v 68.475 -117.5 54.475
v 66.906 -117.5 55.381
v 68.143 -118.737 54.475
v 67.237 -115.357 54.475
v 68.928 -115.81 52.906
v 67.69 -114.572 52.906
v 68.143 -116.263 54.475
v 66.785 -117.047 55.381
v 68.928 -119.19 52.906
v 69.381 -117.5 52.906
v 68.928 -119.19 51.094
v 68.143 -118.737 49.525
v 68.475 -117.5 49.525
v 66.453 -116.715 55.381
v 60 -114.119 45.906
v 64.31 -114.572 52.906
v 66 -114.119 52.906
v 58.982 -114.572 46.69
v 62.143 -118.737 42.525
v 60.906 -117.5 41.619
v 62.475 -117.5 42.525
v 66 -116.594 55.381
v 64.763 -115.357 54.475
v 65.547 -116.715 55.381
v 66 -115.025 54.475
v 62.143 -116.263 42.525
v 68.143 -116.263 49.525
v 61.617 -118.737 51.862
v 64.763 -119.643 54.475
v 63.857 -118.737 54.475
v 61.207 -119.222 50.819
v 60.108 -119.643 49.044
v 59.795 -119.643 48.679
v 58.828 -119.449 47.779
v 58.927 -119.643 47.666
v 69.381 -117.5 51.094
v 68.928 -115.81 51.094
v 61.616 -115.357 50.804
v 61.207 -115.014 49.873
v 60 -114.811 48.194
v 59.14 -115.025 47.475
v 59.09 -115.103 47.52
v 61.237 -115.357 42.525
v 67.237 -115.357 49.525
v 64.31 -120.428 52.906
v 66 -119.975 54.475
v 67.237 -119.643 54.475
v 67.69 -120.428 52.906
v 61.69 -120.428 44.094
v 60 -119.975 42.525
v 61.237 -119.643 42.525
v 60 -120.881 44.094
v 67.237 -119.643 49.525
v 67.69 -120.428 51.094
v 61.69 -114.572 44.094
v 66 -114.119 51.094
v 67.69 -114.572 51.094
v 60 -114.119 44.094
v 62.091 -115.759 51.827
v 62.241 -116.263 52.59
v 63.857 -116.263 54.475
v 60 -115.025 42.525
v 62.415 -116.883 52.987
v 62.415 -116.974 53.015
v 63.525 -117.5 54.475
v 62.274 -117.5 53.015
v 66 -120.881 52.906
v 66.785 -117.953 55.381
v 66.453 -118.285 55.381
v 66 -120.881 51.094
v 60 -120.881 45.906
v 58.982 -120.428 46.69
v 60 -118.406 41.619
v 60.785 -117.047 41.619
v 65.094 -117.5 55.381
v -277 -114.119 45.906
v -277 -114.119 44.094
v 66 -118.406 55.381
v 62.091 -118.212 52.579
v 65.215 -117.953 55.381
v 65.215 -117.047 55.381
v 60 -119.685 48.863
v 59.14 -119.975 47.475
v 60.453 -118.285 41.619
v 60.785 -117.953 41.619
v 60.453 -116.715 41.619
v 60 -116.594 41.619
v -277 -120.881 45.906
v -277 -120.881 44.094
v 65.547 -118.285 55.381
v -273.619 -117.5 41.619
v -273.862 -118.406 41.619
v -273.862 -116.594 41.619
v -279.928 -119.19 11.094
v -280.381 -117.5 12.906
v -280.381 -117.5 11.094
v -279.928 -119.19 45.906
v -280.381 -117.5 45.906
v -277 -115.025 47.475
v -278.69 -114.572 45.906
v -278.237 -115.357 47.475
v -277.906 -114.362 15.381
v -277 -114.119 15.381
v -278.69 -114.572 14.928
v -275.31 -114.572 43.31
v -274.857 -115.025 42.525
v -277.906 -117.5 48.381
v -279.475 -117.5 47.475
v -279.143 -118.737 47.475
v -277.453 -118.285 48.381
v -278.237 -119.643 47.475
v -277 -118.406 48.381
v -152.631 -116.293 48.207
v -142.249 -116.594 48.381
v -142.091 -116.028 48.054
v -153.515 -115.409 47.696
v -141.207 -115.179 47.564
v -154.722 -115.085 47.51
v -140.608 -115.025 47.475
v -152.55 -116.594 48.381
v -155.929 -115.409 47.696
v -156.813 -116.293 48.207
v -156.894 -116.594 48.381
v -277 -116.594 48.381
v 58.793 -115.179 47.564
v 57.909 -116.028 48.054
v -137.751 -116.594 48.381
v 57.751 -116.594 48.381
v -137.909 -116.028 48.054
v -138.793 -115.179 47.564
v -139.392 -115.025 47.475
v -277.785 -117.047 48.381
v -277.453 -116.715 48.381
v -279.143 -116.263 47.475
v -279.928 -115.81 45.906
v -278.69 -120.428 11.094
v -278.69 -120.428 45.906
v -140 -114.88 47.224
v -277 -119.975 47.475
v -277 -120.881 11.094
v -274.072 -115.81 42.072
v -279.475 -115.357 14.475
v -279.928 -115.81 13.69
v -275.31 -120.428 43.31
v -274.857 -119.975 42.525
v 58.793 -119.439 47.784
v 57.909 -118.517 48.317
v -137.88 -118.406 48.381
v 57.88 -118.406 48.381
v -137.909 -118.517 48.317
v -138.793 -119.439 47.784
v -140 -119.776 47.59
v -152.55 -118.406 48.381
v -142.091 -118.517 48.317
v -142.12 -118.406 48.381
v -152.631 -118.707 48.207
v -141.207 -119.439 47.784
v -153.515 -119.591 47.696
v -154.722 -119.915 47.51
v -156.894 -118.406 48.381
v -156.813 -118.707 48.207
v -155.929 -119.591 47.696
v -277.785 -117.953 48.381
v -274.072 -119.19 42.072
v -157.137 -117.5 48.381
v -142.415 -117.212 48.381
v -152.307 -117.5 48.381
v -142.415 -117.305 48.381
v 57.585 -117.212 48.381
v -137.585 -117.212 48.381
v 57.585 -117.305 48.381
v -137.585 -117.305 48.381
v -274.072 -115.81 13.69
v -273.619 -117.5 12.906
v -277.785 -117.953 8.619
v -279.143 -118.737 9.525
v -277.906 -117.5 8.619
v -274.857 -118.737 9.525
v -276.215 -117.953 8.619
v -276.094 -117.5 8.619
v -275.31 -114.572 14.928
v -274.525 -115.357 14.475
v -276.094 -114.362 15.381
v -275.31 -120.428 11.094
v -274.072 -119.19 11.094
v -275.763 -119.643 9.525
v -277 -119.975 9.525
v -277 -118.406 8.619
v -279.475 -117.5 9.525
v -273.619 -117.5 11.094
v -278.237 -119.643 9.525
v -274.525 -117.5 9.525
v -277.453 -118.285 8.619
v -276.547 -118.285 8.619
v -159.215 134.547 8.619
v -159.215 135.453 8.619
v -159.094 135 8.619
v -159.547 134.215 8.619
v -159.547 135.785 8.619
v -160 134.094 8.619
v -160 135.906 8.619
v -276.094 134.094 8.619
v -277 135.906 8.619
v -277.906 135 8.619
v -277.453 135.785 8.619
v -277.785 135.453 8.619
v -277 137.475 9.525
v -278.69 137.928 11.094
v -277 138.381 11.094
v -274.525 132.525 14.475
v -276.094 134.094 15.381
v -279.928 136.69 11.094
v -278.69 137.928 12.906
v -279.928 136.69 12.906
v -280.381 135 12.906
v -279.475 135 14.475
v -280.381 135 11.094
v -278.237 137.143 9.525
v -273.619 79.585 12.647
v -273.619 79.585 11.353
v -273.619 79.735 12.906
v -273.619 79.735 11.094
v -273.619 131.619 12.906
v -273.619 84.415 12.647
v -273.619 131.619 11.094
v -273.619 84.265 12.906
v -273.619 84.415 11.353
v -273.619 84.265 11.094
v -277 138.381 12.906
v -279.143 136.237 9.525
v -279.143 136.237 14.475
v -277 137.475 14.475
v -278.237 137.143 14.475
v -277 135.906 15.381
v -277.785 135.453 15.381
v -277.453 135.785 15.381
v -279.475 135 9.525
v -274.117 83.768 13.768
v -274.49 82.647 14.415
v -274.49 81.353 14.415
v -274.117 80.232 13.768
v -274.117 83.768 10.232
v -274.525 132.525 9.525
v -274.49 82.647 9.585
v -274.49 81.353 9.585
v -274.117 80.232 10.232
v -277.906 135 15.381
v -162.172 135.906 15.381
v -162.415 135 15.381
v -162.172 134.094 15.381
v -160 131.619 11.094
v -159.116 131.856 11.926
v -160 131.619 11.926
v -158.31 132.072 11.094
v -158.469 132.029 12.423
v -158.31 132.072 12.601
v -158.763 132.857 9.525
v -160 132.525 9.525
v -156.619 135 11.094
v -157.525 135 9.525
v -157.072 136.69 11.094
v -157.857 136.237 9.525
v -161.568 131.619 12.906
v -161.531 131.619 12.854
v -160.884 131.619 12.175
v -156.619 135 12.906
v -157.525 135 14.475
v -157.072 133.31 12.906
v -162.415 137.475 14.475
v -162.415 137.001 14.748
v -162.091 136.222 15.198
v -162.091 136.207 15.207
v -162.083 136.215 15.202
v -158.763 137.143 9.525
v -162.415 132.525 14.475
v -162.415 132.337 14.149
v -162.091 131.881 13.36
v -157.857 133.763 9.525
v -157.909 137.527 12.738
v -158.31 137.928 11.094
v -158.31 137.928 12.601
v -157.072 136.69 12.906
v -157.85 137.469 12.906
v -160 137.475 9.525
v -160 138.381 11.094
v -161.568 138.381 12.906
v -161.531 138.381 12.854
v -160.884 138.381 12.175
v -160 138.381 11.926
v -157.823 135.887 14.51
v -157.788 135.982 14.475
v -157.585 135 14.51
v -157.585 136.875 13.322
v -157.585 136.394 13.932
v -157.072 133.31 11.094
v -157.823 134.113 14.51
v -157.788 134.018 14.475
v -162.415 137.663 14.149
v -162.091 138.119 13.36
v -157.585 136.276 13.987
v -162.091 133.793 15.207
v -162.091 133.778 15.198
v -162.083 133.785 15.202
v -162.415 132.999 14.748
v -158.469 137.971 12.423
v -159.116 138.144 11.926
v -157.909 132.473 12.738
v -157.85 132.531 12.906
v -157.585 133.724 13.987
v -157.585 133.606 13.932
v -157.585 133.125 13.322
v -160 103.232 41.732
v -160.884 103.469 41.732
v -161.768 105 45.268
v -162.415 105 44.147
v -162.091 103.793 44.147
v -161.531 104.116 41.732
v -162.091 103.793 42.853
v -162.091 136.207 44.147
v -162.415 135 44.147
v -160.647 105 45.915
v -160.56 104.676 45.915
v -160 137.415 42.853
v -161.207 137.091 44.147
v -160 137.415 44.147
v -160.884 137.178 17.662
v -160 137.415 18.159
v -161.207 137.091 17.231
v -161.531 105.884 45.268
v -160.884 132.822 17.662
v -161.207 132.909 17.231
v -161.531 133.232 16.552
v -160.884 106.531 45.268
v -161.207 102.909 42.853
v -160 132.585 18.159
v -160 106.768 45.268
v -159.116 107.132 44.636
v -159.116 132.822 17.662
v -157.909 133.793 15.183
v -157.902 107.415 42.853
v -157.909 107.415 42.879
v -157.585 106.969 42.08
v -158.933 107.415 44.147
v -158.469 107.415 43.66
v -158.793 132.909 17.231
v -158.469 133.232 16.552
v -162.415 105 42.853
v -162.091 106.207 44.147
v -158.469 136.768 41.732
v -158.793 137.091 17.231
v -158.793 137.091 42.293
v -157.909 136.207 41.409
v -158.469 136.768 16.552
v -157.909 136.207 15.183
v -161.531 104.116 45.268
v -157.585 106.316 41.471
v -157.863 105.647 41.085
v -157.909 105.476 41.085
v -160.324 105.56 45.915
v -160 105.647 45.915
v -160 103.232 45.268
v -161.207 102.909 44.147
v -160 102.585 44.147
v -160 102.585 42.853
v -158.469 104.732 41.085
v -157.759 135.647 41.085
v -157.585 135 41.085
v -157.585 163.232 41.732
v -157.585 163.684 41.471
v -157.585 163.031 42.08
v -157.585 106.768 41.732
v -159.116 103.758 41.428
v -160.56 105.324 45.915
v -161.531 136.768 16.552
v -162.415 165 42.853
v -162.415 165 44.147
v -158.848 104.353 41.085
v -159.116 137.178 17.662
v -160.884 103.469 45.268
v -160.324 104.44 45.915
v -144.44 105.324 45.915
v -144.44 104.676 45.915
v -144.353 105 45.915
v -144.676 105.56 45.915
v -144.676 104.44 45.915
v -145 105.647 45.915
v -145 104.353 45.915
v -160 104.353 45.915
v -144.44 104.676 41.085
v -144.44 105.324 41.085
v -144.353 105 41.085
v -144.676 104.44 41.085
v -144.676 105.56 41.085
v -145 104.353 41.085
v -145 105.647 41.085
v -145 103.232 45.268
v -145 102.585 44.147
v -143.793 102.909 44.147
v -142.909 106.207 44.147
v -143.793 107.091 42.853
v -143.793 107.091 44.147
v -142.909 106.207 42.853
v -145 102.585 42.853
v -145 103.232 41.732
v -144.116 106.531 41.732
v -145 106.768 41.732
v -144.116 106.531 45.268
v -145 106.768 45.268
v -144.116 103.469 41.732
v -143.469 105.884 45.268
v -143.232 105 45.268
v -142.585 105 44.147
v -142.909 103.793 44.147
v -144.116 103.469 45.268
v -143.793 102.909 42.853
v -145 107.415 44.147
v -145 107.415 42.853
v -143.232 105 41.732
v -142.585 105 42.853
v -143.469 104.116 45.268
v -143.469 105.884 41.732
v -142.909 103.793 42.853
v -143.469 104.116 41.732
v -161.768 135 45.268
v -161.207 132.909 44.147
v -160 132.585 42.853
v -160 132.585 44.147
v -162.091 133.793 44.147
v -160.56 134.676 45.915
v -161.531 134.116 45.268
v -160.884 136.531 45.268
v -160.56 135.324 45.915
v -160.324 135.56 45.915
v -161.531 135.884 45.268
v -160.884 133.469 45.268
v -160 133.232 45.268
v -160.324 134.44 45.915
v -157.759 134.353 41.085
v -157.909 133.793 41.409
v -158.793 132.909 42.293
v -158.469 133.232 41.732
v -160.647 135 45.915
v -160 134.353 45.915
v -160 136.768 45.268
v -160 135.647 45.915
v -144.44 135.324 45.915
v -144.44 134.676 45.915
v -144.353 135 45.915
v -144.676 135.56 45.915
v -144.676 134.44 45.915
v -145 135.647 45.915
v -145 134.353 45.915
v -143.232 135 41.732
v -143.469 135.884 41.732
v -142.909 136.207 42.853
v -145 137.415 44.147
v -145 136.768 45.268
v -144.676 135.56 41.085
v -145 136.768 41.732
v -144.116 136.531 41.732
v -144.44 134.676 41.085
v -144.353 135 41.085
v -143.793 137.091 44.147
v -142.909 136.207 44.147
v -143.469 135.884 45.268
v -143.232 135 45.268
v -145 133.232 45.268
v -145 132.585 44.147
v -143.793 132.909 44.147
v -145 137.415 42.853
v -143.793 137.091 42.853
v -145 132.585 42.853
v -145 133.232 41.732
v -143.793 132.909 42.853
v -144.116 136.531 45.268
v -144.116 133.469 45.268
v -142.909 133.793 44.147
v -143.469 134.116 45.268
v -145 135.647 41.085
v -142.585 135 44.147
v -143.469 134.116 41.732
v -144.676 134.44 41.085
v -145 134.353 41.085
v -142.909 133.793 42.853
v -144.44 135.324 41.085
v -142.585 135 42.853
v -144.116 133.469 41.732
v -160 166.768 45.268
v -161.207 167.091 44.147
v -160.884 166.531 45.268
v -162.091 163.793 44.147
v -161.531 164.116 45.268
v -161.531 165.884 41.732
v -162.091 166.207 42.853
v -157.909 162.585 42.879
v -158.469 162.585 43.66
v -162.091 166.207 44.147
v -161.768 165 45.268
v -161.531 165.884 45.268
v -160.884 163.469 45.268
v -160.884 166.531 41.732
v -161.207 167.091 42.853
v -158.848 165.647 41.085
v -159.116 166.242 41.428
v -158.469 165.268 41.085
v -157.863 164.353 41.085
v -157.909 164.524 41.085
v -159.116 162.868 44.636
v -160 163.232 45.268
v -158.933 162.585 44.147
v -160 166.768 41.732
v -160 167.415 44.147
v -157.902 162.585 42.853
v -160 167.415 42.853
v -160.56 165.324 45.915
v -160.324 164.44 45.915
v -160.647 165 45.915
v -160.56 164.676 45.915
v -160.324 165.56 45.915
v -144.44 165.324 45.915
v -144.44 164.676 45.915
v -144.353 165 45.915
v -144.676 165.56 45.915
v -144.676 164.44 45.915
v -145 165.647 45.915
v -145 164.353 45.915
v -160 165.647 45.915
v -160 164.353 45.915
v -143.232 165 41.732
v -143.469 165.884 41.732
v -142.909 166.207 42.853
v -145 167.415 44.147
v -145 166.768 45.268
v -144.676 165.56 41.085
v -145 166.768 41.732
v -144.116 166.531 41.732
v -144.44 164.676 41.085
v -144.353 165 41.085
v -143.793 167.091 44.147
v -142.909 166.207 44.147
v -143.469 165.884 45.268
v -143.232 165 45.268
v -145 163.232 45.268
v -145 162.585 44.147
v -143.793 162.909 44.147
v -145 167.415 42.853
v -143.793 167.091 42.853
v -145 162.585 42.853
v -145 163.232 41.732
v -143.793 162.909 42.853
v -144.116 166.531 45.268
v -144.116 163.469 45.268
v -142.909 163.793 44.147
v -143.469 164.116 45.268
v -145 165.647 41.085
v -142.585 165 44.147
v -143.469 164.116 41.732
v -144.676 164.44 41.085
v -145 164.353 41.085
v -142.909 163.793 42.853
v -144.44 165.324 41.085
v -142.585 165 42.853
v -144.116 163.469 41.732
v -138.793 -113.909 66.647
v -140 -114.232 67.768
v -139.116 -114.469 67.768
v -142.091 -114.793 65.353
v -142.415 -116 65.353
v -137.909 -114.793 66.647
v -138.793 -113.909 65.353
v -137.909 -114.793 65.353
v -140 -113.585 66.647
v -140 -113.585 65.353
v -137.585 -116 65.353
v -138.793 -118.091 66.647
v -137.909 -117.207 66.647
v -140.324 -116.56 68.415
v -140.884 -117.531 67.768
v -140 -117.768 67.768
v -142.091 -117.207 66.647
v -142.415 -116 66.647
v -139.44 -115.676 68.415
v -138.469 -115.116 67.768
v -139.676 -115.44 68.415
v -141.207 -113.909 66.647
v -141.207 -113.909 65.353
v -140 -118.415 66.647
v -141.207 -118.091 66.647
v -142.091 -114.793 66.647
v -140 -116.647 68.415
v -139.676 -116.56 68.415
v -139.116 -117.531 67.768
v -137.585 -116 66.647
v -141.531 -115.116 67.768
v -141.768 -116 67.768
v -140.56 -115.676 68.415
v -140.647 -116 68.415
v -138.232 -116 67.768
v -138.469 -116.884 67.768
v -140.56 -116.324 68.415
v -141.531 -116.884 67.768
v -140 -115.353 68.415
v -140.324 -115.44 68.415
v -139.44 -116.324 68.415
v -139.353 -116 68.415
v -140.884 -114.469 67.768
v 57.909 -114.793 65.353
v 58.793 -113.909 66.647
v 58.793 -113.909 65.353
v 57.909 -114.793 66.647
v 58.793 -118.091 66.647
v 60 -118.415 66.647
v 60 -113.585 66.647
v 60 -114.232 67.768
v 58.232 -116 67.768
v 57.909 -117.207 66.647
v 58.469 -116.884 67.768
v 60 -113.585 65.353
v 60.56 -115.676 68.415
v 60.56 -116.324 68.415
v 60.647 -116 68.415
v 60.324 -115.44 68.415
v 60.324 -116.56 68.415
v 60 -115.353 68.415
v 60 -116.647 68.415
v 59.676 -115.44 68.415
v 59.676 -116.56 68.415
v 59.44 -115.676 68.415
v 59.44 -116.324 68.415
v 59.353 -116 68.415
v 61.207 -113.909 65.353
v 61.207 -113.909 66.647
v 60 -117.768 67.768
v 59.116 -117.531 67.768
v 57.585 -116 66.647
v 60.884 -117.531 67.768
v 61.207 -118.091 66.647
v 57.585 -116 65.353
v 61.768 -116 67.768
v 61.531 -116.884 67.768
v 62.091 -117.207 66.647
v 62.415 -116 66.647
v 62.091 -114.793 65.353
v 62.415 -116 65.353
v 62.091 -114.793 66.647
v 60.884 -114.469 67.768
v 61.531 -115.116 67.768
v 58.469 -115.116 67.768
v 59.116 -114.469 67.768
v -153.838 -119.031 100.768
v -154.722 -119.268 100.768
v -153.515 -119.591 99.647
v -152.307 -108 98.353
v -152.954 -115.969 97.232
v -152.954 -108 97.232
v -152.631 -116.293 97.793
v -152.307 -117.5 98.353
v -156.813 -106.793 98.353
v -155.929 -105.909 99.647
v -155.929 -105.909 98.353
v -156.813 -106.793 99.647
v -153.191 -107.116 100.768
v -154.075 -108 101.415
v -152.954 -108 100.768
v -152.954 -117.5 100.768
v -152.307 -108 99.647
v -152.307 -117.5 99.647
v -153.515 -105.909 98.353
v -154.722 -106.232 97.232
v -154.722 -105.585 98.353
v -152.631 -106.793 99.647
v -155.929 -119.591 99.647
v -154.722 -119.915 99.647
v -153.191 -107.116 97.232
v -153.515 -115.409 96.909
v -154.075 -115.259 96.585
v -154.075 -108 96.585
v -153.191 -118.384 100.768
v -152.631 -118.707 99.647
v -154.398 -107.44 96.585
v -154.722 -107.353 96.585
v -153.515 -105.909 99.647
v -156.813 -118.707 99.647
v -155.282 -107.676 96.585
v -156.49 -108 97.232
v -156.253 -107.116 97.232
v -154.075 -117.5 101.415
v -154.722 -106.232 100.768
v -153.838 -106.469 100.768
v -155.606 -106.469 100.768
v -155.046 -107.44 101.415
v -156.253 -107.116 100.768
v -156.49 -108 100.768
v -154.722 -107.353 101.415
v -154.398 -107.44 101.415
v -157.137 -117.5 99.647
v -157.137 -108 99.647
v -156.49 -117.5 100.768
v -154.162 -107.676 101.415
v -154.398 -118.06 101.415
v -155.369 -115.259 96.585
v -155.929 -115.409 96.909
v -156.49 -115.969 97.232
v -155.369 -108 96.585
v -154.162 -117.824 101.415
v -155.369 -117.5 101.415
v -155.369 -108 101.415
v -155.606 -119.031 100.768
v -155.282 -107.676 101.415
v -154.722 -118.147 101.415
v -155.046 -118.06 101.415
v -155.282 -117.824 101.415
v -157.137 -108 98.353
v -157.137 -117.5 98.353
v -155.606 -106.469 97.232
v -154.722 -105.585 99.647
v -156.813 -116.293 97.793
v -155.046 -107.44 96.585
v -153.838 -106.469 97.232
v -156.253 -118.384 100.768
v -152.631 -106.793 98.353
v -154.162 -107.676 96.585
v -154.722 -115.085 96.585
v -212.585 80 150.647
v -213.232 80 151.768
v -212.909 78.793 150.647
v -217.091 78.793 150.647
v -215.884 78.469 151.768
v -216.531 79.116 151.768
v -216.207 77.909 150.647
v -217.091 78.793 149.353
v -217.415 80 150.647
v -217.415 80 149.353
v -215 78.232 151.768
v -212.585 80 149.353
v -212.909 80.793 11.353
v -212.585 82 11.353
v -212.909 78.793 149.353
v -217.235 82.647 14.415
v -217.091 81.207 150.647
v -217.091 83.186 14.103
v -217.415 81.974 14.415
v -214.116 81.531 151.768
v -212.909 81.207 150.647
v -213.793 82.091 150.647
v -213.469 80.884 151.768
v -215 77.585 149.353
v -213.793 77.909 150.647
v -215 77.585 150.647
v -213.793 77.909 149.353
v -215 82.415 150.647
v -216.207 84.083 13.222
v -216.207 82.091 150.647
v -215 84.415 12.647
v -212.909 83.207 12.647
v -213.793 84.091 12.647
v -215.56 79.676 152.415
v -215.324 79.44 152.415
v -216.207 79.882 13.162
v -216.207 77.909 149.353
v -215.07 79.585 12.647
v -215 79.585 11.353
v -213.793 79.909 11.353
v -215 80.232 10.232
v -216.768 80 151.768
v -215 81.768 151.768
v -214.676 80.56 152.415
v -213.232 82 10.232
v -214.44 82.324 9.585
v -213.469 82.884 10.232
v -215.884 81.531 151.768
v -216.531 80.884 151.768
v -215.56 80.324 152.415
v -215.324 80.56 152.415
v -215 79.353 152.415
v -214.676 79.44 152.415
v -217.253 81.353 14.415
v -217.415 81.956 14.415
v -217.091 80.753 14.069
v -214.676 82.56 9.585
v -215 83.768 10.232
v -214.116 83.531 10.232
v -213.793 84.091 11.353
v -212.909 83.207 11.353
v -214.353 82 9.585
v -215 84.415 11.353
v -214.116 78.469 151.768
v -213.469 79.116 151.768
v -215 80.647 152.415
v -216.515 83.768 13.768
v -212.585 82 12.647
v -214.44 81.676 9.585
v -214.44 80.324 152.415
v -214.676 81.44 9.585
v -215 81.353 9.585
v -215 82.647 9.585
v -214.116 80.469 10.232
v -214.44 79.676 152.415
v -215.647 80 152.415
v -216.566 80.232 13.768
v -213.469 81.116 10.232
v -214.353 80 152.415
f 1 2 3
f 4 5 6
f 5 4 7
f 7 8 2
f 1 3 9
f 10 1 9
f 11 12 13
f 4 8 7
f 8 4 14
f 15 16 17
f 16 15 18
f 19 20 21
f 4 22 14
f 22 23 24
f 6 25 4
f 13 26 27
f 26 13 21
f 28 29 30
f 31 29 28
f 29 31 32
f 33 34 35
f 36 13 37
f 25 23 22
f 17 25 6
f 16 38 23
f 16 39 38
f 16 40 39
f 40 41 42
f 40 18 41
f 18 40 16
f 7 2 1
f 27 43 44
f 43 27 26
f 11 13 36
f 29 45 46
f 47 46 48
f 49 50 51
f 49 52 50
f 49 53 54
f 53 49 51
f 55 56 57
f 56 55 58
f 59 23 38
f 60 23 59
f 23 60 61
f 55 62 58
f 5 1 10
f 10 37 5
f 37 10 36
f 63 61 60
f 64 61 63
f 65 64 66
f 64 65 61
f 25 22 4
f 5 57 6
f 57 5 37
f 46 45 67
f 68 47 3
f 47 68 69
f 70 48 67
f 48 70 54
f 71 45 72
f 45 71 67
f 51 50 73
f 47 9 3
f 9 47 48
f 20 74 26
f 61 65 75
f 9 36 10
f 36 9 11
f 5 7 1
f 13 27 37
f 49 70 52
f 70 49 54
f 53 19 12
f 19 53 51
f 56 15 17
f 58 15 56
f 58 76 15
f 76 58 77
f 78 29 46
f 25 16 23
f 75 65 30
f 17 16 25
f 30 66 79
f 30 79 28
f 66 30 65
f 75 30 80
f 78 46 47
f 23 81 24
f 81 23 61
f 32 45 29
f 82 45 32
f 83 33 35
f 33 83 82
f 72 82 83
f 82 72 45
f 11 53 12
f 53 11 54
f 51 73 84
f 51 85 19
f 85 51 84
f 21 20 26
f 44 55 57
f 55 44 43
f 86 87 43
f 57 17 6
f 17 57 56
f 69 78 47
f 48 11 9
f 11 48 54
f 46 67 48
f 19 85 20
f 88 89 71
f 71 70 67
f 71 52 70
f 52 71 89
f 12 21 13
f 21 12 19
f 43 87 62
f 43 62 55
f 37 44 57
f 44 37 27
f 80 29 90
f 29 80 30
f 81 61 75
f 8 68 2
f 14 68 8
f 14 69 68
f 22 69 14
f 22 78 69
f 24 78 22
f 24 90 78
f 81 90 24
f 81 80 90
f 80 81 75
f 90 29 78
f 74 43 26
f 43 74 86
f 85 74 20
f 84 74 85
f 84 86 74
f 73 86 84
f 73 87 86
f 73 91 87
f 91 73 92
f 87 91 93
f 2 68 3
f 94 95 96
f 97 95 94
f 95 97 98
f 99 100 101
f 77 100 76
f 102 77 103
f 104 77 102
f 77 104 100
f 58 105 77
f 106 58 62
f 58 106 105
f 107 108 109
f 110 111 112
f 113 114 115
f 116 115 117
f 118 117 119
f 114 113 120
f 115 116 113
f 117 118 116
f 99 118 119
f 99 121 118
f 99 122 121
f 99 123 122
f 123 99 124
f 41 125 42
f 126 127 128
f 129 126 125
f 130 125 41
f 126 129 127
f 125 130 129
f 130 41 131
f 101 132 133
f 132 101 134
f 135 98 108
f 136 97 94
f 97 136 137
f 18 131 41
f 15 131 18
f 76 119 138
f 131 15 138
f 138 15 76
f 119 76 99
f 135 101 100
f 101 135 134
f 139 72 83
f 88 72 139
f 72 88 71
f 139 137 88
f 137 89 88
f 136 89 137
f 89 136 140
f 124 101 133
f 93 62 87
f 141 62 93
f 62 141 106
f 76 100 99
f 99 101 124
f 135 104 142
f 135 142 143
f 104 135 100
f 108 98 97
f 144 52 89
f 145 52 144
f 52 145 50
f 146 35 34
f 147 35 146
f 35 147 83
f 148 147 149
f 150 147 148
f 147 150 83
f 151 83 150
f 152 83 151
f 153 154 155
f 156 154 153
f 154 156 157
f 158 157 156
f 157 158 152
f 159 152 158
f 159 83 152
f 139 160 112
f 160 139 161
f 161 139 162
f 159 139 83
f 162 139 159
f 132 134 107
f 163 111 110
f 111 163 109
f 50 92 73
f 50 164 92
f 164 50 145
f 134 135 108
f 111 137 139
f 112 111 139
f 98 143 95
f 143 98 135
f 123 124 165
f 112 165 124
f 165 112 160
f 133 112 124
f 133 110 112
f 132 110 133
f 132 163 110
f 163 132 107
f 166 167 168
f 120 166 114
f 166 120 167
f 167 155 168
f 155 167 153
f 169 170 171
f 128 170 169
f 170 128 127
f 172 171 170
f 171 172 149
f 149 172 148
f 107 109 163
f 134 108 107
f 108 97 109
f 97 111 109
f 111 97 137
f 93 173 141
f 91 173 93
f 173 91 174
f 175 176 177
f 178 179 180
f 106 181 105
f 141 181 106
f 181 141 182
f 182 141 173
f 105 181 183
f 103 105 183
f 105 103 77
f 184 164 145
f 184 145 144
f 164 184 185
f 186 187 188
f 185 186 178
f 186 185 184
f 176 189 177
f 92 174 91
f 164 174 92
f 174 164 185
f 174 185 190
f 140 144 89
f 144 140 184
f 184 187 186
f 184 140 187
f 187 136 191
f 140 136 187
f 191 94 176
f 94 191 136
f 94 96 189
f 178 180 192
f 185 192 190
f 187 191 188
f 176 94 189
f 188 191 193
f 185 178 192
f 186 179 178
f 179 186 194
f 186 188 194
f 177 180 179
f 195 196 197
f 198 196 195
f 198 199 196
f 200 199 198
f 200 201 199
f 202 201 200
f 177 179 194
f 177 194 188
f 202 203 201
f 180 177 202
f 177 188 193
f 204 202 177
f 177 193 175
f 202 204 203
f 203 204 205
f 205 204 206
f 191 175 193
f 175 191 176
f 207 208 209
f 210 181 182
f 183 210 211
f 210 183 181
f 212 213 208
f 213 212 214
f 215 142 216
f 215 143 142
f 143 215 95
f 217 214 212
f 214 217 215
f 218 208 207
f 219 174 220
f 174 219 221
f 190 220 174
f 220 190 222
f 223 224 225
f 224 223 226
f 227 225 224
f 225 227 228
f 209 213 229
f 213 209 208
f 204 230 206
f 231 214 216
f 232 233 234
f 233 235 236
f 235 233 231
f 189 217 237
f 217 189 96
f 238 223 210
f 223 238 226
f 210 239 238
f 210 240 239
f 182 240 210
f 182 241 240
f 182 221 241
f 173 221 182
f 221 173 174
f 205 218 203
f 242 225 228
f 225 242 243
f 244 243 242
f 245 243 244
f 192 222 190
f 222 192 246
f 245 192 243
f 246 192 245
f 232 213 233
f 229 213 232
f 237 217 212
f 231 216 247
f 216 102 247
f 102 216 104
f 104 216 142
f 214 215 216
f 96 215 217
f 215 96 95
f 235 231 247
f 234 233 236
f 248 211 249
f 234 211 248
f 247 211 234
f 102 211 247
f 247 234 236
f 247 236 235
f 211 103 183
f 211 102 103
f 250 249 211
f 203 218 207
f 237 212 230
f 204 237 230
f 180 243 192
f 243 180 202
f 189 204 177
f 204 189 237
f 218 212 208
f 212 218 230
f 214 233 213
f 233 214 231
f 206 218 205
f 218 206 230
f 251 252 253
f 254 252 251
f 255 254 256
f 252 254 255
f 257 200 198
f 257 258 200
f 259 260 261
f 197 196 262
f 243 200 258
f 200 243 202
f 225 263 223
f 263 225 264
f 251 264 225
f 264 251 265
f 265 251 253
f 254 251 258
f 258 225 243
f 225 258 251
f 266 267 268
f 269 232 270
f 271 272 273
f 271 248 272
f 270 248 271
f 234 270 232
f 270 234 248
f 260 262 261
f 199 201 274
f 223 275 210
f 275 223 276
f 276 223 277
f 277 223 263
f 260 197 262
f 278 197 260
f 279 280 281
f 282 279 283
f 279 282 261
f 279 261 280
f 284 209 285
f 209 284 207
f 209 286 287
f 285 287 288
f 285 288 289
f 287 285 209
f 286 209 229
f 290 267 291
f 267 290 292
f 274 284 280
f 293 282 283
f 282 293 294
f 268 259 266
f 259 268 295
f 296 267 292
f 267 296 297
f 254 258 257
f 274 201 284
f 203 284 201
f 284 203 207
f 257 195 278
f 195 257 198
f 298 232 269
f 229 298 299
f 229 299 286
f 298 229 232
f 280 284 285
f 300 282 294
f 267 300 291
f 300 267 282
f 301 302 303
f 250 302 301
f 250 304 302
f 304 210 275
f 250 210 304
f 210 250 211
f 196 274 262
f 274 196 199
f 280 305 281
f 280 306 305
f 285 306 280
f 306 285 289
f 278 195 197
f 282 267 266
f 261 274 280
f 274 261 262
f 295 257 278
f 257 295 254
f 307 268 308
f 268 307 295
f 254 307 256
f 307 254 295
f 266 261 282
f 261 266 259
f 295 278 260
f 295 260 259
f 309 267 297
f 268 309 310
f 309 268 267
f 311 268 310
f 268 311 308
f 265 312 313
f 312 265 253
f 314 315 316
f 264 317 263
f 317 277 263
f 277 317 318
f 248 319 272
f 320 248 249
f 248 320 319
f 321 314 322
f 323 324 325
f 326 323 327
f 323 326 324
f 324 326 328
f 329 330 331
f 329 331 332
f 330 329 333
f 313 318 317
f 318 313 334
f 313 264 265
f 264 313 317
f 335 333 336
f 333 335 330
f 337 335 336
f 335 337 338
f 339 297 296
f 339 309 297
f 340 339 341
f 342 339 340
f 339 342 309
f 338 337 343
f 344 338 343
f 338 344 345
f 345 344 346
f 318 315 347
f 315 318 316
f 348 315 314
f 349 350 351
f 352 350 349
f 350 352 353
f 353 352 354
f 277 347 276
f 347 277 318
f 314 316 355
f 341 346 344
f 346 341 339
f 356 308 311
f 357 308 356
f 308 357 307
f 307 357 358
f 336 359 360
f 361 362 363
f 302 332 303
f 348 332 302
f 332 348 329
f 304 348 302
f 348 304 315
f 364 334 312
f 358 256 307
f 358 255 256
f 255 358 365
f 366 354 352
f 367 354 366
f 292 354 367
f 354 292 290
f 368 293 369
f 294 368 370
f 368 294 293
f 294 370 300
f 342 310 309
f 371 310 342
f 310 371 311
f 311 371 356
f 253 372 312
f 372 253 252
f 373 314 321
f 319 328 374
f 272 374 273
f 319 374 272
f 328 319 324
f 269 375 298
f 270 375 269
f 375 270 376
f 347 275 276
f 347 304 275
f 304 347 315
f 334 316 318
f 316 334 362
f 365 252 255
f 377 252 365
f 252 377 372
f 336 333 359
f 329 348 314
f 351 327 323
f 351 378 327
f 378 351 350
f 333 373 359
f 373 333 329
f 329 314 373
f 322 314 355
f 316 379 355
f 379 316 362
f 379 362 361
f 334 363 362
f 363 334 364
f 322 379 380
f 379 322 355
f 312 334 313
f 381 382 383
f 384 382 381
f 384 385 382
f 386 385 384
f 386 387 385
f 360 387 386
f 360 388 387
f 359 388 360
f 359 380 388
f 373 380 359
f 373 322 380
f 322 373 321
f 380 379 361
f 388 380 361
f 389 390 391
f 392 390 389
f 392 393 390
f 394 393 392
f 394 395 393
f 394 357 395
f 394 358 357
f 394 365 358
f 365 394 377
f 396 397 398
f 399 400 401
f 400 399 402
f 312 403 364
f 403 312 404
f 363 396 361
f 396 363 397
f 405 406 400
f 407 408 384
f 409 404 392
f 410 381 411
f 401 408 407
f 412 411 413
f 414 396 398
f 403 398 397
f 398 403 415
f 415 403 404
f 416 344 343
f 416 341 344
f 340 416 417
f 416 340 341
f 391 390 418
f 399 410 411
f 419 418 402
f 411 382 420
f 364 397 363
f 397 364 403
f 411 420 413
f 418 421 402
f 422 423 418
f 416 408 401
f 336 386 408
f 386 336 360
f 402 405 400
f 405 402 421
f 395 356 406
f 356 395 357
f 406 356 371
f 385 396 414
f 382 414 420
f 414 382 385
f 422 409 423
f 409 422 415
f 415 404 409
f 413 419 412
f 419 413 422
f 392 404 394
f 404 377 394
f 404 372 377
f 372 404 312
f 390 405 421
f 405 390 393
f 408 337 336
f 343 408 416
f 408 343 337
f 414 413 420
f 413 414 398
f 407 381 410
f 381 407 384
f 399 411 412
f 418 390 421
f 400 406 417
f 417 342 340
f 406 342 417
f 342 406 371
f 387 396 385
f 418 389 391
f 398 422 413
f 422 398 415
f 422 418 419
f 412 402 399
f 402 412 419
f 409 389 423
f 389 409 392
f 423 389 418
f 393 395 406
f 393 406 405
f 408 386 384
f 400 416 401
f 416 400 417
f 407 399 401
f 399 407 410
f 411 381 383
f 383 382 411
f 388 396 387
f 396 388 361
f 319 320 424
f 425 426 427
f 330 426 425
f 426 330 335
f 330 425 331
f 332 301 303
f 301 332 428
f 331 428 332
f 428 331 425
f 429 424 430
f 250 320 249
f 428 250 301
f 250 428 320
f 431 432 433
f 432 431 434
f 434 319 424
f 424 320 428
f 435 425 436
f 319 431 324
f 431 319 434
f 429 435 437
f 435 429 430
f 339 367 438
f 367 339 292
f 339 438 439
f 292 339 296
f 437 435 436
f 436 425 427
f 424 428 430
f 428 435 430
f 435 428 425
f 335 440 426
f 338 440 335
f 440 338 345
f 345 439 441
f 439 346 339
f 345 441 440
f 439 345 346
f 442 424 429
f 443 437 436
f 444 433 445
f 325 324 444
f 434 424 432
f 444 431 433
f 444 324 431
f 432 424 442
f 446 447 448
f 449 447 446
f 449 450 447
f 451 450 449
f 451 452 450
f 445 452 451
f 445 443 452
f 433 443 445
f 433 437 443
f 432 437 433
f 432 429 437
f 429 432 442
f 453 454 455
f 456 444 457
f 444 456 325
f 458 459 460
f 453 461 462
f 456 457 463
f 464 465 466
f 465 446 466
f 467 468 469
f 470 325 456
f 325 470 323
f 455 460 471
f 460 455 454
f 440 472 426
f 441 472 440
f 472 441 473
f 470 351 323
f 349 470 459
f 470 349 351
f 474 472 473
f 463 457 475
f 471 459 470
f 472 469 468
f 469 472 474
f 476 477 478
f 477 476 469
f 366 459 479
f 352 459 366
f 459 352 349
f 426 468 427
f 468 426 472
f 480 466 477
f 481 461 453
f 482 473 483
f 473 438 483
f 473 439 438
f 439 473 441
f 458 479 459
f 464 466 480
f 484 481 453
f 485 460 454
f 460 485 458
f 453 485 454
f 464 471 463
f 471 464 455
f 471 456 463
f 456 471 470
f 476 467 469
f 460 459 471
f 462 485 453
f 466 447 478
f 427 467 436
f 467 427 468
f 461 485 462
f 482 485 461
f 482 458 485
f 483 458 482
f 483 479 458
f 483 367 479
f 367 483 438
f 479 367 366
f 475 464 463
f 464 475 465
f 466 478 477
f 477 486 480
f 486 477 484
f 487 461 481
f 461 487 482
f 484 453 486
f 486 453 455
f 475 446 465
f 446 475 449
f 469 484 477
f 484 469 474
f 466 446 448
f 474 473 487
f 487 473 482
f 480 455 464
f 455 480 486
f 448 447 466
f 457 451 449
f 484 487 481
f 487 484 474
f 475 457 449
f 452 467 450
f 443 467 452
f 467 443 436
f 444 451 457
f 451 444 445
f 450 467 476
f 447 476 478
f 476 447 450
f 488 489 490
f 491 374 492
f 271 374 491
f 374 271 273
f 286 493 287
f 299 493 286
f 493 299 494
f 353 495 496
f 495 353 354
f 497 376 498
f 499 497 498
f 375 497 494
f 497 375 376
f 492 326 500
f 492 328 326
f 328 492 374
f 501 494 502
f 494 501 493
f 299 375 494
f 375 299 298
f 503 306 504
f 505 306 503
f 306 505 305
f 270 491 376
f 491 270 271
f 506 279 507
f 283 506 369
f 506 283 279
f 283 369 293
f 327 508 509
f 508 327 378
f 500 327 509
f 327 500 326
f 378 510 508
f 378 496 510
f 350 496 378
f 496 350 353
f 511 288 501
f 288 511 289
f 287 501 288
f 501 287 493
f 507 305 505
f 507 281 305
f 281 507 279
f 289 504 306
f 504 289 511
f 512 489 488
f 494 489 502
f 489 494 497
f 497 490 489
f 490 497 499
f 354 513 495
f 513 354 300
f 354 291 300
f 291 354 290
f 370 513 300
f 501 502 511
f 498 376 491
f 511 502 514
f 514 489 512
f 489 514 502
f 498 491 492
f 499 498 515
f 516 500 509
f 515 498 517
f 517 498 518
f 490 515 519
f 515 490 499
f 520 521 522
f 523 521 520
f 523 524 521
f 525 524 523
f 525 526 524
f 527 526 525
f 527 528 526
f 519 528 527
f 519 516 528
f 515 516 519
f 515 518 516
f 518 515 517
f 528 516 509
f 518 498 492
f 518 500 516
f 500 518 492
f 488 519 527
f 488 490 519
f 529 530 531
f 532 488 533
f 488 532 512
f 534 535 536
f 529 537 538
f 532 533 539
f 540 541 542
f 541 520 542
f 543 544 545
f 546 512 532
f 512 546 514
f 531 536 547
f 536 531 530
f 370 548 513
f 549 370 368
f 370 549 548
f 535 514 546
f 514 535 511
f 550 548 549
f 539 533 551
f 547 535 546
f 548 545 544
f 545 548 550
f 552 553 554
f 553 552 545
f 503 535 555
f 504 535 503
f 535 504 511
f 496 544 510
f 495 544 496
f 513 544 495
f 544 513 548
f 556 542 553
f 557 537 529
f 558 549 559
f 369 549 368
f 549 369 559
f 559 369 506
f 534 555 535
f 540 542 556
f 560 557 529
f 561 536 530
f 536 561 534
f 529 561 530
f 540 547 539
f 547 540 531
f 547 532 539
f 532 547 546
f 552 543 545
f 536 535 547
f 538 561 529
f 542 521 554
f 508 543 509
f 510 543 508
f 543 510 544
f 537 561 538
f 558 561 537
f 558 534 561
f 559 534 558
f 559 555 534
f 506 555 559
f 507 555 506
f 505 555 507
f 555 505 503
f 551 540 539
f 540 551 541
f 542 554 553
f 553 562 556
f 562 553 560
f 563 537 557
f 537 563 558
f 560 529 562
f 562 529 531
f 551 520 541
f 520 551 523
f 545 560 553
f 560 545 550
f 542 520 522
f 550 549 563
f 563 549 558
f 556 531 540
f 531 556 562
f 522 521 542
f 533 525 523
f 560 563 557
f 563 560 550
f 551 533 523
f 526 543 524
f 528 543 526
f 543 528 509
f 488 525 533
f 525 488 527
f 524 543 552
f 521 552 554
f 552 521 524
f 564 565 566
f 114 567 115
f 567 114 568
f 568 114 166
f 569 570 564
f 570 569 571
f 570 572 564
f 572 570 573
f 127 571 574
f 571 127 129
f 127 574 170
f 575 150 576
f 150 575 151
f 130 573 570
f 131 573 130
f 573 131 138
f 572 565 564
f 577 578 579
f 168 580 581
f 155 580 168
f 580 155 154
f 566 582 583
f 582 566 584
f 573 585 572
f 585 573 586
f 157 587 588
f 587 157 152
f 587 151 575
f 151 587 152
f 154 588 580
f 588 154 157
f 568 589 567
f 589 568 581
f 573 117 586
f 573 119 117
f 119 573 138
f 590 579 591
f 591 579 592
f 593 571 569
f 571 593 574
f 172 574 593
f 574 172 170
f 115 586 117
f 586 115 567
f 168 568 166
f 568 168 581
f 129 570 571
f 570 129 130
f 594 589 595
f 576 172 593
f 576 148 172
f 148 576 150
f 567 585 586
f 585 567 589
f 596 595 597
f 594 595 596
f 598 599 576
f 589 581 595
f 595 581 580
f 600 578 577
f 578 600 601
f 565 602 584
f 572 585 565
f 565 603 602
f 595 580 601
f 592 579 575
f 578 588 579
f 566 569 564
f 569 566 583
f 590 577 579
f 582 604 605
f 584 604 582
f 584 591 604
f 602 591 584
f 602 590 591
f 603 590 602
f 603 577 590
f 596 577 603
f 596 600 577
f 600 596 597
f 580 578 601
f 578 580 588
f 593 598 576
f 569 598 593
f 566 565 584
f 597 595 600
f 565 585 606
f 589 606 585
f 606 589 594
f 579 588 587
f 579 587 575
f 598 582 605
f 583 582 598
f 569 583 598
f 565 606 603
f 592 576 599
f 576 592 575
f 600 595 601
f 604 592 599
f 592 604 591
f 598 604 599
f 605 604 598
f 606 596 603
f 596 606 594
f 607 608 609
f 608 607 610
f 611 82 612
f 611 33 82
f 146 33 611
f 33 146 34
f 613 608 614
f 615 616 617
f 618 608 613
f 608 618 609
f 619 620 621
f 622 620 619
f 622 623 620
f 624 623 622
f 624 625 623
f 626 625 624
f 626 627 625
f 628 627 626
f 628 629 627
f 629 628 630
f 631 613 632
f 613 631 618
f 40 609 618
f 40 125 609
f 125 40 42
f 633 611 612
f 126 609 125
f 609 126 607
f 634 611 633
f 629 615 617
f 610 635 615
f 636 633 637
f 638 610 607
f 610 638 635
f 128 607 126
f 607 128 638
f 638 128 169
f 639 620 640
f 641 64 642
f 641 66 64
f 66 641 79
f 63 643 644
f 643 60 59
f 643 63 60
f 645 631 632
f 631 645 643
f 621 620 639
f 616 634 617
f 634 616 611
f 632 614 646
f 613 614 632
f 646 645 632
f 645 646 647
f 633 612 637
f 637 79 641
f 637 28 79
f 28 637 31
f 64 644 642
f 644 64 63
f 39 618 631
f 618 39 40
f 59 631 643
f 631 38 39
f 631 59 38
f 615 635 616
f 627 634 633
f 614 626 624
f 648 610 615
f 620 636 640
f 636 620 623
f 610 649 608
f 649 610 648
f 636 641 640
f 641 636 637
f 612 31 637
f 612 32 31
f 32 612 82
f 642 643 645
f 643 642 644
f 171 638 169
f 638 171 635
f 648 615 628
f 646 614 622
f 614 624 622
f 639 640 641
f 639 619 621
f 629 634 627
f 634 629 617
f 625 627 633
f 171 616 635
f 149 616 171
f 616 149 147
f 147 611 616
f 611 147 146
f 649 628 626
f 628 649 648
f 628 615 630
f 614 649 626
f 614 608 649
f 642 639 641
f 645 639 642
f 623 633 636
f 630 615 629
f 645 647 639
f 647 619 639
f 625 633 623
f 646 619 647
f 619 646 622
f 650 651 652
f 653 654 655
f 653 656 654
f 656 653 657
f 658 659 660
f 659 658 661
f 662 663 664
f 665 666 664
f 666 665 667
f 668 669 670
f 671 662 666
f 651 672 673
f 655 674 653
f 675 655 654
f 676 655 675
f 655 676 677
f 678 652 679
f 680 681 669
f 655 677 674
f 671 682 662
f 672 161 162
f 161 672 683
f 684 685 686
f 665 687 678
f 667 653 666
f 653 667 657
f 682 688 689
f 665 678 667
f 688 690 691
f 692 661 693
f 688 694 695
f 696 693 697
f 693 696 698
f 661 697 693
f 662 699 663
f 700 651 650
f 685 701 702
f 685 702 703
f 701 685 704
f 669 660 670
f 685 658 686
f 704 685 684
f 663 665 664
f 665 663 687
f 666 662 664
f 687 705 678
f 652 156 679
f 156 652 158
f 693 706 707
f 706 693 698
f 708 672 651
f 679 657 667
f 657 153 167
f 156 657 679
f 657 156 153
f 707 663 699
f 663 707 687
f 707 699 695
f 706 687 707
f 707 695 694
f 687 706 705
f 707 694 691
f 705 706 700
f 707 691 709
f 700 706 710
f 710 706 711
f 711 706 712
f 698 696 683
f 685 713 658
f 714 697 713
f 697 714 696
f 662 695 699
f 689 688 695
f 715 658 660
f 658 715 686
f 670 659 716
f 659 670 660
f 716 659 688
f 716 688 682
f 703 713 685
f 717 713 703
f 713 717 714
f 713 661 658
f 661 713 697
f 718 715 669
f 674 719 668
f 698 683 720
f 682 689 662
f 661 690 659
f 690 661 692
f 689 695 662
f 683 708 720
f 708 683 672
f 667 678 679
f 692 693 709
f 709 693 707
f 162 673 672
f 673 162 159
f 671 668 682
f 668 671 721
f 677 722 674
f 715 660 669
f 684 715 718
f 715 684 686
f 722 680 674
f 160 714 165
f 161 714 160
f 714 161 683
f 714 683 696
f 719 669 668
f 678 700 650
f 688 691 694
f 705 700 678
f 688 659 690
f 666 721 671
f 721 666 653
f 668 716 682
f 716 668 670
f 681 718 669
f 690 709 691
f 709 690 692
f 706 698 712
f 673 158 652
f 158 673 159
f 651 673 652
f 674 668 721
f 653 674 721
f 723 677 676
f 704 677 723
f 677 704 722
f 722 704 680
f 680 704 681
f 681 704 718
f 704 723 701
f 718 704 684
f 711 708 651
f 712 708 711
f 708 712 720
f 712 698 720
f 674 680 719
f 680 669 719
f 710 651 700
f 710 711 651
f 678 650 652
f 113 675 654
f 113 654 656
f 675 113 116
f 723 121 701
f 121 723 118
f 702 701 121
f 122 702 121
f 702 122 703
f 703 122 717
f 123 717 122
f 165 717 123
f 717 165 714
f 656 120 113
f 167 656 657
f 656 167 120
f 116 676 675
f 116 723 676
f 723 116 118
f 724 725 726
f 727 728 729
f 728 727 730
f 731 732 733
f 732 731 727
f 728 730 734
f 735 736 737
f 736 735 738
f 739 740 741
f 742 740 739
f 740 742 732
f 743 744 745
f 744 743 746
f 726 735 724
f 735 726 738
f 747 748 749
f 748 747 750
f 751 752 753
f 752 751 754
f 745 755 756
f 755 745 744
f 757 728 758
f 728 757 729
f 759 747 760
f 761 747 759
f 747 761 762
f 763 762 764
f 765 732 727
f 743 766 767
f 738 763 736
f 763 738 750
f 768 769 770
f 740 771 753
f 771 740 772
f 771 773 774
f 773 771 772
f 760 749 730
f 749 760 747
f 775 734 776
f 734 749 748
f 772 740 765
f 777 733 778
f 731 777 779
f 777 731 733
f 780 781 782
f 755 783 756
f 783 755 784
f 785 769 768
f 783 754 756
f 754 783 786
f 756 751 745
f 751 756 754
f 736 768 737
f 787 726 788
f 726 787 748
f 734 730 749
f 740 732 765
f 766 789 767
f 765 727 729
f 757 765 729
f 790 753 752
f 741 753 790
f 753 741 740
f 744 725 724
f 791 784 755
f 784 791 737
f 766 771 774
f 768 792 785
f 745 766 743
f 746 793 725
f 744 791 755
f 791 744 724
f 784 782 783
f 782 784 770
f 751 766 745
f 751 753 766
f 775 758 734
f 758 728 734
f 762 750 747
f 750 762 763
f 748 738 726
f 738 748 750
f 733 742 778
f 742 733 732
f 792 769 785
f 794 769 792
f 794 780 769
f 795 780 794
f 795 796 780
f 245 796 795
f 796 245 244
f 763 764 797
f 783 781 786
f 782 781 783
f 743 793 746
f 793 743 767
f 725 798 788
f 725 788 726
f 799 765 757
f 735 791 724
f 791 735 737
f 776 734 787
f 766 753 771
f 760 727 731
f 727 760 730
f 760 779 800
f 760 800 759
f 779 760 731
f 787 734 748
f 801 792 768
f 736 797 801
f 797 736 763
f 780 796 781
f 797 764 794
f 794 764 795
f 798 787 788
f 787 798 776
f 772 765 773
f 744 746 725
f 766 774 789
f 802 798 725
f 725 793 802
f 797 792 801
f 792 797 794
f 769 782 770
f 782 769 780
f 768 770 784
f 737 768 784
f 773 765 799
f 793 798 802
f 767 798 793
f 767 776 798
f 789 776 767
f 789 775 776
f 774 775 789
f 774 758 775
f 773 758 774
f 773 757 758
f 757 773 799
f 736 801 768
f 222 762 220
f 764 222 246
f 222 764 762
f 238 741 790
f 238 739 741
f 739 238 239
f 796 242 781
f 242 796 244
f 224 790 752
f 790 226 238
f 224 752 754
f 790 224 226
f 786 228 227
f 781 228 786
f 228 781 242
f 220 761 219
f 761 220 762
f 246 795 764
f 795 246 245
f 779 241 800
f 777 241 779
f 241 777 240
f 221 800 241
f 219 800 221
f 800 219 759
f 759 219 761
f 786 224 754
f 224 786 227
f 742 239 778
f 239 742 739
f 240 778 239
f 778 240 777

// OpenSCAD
// v3 assembly video: wiring and vacuum-line runs (step 11). Rough routing, as in
// assembly.scad asm_harness() / asm_vac_hose() / asm_ribbon() / asm_cell_lead(),
// split so each run can be shown on its own.
// openscad --backend=manifold -D 'part="v3_harness"' -o harness.stl w_wire.scad
use <../assembly.scad>
use <../pump_bracket.scad>
use <../suction_arm.scad>
include <hw_common.scad>
part = "v3_harness";
P = part;
ax = pick_arm_pivot()[0]; az = pick_arm_pivot()[1];
roller_x = [-140, 60];

module harness_main() {
    chain([[66, -117.5, 52], [60, -117.5, 45], [-277, -117.5, 45], [-277, -117.5, 12],
           [-277, 135, 12], [-160, 135, 12]], 7);
    for (y = [105, 135, 165]) chain([[-160, 135, 12], [-160, y, 43.5], [-145, y, 43.5]], 5);
    for (x = roller_x) chain([[x, -116, 66], [x, -117.5, 45]], 5);                       // N20 drops
    chain([[ax, -108, 99], [ax, -117.5, 99], [ax, -117.5, 45]], 5);                      // arm servo lead
    chain([[-215, 80, 150], [-215, 82, 12], [-277, 82, 12]], 5);                         // hopper motor + switches
}
module leads_12v() {
    let(v = vent_valve_leads())
        chain([[v[0], v[1] - 2.5, v[2]], [v[0], v[1] - 2.5, 12], [-280, v[1] - 2.5, 12],
               [-280, -117.5, 12], [-277, -117.5, 12]], 4);
    let(pr = pump_rear()) chain([[pr[0] - 2.5, pr[1], pr[2]], [-280, pr[1], pr[2]], [-280, pr[1], 12]], 4);
}
// vacuum tube, pump side: nozzle → tee → along Y −205 → to the foot of the arm column
module tube_pump() chain([pump_nozzle_tip(), vent_tee_pos(), [ax + 8, -205, 28], [ax + 8, -205, 18], [ax + 8, -160, 18]], 4);
module tube_branch() chain([vent_tee_pos() + [0, -5, 0], vent_valve_root()], 4);

if (P == "v3_harness") harness_main();
if (P == "v3_leads12") leads_12v();
if (P == "v3_ribbon") asm_ribbon();
if (P == "v3_cell_lead") asm_cell_lead(0);
if (P == "v3_tube_pump") tube_pump();
if (P == "v3_tube_branch") tube_branch();
